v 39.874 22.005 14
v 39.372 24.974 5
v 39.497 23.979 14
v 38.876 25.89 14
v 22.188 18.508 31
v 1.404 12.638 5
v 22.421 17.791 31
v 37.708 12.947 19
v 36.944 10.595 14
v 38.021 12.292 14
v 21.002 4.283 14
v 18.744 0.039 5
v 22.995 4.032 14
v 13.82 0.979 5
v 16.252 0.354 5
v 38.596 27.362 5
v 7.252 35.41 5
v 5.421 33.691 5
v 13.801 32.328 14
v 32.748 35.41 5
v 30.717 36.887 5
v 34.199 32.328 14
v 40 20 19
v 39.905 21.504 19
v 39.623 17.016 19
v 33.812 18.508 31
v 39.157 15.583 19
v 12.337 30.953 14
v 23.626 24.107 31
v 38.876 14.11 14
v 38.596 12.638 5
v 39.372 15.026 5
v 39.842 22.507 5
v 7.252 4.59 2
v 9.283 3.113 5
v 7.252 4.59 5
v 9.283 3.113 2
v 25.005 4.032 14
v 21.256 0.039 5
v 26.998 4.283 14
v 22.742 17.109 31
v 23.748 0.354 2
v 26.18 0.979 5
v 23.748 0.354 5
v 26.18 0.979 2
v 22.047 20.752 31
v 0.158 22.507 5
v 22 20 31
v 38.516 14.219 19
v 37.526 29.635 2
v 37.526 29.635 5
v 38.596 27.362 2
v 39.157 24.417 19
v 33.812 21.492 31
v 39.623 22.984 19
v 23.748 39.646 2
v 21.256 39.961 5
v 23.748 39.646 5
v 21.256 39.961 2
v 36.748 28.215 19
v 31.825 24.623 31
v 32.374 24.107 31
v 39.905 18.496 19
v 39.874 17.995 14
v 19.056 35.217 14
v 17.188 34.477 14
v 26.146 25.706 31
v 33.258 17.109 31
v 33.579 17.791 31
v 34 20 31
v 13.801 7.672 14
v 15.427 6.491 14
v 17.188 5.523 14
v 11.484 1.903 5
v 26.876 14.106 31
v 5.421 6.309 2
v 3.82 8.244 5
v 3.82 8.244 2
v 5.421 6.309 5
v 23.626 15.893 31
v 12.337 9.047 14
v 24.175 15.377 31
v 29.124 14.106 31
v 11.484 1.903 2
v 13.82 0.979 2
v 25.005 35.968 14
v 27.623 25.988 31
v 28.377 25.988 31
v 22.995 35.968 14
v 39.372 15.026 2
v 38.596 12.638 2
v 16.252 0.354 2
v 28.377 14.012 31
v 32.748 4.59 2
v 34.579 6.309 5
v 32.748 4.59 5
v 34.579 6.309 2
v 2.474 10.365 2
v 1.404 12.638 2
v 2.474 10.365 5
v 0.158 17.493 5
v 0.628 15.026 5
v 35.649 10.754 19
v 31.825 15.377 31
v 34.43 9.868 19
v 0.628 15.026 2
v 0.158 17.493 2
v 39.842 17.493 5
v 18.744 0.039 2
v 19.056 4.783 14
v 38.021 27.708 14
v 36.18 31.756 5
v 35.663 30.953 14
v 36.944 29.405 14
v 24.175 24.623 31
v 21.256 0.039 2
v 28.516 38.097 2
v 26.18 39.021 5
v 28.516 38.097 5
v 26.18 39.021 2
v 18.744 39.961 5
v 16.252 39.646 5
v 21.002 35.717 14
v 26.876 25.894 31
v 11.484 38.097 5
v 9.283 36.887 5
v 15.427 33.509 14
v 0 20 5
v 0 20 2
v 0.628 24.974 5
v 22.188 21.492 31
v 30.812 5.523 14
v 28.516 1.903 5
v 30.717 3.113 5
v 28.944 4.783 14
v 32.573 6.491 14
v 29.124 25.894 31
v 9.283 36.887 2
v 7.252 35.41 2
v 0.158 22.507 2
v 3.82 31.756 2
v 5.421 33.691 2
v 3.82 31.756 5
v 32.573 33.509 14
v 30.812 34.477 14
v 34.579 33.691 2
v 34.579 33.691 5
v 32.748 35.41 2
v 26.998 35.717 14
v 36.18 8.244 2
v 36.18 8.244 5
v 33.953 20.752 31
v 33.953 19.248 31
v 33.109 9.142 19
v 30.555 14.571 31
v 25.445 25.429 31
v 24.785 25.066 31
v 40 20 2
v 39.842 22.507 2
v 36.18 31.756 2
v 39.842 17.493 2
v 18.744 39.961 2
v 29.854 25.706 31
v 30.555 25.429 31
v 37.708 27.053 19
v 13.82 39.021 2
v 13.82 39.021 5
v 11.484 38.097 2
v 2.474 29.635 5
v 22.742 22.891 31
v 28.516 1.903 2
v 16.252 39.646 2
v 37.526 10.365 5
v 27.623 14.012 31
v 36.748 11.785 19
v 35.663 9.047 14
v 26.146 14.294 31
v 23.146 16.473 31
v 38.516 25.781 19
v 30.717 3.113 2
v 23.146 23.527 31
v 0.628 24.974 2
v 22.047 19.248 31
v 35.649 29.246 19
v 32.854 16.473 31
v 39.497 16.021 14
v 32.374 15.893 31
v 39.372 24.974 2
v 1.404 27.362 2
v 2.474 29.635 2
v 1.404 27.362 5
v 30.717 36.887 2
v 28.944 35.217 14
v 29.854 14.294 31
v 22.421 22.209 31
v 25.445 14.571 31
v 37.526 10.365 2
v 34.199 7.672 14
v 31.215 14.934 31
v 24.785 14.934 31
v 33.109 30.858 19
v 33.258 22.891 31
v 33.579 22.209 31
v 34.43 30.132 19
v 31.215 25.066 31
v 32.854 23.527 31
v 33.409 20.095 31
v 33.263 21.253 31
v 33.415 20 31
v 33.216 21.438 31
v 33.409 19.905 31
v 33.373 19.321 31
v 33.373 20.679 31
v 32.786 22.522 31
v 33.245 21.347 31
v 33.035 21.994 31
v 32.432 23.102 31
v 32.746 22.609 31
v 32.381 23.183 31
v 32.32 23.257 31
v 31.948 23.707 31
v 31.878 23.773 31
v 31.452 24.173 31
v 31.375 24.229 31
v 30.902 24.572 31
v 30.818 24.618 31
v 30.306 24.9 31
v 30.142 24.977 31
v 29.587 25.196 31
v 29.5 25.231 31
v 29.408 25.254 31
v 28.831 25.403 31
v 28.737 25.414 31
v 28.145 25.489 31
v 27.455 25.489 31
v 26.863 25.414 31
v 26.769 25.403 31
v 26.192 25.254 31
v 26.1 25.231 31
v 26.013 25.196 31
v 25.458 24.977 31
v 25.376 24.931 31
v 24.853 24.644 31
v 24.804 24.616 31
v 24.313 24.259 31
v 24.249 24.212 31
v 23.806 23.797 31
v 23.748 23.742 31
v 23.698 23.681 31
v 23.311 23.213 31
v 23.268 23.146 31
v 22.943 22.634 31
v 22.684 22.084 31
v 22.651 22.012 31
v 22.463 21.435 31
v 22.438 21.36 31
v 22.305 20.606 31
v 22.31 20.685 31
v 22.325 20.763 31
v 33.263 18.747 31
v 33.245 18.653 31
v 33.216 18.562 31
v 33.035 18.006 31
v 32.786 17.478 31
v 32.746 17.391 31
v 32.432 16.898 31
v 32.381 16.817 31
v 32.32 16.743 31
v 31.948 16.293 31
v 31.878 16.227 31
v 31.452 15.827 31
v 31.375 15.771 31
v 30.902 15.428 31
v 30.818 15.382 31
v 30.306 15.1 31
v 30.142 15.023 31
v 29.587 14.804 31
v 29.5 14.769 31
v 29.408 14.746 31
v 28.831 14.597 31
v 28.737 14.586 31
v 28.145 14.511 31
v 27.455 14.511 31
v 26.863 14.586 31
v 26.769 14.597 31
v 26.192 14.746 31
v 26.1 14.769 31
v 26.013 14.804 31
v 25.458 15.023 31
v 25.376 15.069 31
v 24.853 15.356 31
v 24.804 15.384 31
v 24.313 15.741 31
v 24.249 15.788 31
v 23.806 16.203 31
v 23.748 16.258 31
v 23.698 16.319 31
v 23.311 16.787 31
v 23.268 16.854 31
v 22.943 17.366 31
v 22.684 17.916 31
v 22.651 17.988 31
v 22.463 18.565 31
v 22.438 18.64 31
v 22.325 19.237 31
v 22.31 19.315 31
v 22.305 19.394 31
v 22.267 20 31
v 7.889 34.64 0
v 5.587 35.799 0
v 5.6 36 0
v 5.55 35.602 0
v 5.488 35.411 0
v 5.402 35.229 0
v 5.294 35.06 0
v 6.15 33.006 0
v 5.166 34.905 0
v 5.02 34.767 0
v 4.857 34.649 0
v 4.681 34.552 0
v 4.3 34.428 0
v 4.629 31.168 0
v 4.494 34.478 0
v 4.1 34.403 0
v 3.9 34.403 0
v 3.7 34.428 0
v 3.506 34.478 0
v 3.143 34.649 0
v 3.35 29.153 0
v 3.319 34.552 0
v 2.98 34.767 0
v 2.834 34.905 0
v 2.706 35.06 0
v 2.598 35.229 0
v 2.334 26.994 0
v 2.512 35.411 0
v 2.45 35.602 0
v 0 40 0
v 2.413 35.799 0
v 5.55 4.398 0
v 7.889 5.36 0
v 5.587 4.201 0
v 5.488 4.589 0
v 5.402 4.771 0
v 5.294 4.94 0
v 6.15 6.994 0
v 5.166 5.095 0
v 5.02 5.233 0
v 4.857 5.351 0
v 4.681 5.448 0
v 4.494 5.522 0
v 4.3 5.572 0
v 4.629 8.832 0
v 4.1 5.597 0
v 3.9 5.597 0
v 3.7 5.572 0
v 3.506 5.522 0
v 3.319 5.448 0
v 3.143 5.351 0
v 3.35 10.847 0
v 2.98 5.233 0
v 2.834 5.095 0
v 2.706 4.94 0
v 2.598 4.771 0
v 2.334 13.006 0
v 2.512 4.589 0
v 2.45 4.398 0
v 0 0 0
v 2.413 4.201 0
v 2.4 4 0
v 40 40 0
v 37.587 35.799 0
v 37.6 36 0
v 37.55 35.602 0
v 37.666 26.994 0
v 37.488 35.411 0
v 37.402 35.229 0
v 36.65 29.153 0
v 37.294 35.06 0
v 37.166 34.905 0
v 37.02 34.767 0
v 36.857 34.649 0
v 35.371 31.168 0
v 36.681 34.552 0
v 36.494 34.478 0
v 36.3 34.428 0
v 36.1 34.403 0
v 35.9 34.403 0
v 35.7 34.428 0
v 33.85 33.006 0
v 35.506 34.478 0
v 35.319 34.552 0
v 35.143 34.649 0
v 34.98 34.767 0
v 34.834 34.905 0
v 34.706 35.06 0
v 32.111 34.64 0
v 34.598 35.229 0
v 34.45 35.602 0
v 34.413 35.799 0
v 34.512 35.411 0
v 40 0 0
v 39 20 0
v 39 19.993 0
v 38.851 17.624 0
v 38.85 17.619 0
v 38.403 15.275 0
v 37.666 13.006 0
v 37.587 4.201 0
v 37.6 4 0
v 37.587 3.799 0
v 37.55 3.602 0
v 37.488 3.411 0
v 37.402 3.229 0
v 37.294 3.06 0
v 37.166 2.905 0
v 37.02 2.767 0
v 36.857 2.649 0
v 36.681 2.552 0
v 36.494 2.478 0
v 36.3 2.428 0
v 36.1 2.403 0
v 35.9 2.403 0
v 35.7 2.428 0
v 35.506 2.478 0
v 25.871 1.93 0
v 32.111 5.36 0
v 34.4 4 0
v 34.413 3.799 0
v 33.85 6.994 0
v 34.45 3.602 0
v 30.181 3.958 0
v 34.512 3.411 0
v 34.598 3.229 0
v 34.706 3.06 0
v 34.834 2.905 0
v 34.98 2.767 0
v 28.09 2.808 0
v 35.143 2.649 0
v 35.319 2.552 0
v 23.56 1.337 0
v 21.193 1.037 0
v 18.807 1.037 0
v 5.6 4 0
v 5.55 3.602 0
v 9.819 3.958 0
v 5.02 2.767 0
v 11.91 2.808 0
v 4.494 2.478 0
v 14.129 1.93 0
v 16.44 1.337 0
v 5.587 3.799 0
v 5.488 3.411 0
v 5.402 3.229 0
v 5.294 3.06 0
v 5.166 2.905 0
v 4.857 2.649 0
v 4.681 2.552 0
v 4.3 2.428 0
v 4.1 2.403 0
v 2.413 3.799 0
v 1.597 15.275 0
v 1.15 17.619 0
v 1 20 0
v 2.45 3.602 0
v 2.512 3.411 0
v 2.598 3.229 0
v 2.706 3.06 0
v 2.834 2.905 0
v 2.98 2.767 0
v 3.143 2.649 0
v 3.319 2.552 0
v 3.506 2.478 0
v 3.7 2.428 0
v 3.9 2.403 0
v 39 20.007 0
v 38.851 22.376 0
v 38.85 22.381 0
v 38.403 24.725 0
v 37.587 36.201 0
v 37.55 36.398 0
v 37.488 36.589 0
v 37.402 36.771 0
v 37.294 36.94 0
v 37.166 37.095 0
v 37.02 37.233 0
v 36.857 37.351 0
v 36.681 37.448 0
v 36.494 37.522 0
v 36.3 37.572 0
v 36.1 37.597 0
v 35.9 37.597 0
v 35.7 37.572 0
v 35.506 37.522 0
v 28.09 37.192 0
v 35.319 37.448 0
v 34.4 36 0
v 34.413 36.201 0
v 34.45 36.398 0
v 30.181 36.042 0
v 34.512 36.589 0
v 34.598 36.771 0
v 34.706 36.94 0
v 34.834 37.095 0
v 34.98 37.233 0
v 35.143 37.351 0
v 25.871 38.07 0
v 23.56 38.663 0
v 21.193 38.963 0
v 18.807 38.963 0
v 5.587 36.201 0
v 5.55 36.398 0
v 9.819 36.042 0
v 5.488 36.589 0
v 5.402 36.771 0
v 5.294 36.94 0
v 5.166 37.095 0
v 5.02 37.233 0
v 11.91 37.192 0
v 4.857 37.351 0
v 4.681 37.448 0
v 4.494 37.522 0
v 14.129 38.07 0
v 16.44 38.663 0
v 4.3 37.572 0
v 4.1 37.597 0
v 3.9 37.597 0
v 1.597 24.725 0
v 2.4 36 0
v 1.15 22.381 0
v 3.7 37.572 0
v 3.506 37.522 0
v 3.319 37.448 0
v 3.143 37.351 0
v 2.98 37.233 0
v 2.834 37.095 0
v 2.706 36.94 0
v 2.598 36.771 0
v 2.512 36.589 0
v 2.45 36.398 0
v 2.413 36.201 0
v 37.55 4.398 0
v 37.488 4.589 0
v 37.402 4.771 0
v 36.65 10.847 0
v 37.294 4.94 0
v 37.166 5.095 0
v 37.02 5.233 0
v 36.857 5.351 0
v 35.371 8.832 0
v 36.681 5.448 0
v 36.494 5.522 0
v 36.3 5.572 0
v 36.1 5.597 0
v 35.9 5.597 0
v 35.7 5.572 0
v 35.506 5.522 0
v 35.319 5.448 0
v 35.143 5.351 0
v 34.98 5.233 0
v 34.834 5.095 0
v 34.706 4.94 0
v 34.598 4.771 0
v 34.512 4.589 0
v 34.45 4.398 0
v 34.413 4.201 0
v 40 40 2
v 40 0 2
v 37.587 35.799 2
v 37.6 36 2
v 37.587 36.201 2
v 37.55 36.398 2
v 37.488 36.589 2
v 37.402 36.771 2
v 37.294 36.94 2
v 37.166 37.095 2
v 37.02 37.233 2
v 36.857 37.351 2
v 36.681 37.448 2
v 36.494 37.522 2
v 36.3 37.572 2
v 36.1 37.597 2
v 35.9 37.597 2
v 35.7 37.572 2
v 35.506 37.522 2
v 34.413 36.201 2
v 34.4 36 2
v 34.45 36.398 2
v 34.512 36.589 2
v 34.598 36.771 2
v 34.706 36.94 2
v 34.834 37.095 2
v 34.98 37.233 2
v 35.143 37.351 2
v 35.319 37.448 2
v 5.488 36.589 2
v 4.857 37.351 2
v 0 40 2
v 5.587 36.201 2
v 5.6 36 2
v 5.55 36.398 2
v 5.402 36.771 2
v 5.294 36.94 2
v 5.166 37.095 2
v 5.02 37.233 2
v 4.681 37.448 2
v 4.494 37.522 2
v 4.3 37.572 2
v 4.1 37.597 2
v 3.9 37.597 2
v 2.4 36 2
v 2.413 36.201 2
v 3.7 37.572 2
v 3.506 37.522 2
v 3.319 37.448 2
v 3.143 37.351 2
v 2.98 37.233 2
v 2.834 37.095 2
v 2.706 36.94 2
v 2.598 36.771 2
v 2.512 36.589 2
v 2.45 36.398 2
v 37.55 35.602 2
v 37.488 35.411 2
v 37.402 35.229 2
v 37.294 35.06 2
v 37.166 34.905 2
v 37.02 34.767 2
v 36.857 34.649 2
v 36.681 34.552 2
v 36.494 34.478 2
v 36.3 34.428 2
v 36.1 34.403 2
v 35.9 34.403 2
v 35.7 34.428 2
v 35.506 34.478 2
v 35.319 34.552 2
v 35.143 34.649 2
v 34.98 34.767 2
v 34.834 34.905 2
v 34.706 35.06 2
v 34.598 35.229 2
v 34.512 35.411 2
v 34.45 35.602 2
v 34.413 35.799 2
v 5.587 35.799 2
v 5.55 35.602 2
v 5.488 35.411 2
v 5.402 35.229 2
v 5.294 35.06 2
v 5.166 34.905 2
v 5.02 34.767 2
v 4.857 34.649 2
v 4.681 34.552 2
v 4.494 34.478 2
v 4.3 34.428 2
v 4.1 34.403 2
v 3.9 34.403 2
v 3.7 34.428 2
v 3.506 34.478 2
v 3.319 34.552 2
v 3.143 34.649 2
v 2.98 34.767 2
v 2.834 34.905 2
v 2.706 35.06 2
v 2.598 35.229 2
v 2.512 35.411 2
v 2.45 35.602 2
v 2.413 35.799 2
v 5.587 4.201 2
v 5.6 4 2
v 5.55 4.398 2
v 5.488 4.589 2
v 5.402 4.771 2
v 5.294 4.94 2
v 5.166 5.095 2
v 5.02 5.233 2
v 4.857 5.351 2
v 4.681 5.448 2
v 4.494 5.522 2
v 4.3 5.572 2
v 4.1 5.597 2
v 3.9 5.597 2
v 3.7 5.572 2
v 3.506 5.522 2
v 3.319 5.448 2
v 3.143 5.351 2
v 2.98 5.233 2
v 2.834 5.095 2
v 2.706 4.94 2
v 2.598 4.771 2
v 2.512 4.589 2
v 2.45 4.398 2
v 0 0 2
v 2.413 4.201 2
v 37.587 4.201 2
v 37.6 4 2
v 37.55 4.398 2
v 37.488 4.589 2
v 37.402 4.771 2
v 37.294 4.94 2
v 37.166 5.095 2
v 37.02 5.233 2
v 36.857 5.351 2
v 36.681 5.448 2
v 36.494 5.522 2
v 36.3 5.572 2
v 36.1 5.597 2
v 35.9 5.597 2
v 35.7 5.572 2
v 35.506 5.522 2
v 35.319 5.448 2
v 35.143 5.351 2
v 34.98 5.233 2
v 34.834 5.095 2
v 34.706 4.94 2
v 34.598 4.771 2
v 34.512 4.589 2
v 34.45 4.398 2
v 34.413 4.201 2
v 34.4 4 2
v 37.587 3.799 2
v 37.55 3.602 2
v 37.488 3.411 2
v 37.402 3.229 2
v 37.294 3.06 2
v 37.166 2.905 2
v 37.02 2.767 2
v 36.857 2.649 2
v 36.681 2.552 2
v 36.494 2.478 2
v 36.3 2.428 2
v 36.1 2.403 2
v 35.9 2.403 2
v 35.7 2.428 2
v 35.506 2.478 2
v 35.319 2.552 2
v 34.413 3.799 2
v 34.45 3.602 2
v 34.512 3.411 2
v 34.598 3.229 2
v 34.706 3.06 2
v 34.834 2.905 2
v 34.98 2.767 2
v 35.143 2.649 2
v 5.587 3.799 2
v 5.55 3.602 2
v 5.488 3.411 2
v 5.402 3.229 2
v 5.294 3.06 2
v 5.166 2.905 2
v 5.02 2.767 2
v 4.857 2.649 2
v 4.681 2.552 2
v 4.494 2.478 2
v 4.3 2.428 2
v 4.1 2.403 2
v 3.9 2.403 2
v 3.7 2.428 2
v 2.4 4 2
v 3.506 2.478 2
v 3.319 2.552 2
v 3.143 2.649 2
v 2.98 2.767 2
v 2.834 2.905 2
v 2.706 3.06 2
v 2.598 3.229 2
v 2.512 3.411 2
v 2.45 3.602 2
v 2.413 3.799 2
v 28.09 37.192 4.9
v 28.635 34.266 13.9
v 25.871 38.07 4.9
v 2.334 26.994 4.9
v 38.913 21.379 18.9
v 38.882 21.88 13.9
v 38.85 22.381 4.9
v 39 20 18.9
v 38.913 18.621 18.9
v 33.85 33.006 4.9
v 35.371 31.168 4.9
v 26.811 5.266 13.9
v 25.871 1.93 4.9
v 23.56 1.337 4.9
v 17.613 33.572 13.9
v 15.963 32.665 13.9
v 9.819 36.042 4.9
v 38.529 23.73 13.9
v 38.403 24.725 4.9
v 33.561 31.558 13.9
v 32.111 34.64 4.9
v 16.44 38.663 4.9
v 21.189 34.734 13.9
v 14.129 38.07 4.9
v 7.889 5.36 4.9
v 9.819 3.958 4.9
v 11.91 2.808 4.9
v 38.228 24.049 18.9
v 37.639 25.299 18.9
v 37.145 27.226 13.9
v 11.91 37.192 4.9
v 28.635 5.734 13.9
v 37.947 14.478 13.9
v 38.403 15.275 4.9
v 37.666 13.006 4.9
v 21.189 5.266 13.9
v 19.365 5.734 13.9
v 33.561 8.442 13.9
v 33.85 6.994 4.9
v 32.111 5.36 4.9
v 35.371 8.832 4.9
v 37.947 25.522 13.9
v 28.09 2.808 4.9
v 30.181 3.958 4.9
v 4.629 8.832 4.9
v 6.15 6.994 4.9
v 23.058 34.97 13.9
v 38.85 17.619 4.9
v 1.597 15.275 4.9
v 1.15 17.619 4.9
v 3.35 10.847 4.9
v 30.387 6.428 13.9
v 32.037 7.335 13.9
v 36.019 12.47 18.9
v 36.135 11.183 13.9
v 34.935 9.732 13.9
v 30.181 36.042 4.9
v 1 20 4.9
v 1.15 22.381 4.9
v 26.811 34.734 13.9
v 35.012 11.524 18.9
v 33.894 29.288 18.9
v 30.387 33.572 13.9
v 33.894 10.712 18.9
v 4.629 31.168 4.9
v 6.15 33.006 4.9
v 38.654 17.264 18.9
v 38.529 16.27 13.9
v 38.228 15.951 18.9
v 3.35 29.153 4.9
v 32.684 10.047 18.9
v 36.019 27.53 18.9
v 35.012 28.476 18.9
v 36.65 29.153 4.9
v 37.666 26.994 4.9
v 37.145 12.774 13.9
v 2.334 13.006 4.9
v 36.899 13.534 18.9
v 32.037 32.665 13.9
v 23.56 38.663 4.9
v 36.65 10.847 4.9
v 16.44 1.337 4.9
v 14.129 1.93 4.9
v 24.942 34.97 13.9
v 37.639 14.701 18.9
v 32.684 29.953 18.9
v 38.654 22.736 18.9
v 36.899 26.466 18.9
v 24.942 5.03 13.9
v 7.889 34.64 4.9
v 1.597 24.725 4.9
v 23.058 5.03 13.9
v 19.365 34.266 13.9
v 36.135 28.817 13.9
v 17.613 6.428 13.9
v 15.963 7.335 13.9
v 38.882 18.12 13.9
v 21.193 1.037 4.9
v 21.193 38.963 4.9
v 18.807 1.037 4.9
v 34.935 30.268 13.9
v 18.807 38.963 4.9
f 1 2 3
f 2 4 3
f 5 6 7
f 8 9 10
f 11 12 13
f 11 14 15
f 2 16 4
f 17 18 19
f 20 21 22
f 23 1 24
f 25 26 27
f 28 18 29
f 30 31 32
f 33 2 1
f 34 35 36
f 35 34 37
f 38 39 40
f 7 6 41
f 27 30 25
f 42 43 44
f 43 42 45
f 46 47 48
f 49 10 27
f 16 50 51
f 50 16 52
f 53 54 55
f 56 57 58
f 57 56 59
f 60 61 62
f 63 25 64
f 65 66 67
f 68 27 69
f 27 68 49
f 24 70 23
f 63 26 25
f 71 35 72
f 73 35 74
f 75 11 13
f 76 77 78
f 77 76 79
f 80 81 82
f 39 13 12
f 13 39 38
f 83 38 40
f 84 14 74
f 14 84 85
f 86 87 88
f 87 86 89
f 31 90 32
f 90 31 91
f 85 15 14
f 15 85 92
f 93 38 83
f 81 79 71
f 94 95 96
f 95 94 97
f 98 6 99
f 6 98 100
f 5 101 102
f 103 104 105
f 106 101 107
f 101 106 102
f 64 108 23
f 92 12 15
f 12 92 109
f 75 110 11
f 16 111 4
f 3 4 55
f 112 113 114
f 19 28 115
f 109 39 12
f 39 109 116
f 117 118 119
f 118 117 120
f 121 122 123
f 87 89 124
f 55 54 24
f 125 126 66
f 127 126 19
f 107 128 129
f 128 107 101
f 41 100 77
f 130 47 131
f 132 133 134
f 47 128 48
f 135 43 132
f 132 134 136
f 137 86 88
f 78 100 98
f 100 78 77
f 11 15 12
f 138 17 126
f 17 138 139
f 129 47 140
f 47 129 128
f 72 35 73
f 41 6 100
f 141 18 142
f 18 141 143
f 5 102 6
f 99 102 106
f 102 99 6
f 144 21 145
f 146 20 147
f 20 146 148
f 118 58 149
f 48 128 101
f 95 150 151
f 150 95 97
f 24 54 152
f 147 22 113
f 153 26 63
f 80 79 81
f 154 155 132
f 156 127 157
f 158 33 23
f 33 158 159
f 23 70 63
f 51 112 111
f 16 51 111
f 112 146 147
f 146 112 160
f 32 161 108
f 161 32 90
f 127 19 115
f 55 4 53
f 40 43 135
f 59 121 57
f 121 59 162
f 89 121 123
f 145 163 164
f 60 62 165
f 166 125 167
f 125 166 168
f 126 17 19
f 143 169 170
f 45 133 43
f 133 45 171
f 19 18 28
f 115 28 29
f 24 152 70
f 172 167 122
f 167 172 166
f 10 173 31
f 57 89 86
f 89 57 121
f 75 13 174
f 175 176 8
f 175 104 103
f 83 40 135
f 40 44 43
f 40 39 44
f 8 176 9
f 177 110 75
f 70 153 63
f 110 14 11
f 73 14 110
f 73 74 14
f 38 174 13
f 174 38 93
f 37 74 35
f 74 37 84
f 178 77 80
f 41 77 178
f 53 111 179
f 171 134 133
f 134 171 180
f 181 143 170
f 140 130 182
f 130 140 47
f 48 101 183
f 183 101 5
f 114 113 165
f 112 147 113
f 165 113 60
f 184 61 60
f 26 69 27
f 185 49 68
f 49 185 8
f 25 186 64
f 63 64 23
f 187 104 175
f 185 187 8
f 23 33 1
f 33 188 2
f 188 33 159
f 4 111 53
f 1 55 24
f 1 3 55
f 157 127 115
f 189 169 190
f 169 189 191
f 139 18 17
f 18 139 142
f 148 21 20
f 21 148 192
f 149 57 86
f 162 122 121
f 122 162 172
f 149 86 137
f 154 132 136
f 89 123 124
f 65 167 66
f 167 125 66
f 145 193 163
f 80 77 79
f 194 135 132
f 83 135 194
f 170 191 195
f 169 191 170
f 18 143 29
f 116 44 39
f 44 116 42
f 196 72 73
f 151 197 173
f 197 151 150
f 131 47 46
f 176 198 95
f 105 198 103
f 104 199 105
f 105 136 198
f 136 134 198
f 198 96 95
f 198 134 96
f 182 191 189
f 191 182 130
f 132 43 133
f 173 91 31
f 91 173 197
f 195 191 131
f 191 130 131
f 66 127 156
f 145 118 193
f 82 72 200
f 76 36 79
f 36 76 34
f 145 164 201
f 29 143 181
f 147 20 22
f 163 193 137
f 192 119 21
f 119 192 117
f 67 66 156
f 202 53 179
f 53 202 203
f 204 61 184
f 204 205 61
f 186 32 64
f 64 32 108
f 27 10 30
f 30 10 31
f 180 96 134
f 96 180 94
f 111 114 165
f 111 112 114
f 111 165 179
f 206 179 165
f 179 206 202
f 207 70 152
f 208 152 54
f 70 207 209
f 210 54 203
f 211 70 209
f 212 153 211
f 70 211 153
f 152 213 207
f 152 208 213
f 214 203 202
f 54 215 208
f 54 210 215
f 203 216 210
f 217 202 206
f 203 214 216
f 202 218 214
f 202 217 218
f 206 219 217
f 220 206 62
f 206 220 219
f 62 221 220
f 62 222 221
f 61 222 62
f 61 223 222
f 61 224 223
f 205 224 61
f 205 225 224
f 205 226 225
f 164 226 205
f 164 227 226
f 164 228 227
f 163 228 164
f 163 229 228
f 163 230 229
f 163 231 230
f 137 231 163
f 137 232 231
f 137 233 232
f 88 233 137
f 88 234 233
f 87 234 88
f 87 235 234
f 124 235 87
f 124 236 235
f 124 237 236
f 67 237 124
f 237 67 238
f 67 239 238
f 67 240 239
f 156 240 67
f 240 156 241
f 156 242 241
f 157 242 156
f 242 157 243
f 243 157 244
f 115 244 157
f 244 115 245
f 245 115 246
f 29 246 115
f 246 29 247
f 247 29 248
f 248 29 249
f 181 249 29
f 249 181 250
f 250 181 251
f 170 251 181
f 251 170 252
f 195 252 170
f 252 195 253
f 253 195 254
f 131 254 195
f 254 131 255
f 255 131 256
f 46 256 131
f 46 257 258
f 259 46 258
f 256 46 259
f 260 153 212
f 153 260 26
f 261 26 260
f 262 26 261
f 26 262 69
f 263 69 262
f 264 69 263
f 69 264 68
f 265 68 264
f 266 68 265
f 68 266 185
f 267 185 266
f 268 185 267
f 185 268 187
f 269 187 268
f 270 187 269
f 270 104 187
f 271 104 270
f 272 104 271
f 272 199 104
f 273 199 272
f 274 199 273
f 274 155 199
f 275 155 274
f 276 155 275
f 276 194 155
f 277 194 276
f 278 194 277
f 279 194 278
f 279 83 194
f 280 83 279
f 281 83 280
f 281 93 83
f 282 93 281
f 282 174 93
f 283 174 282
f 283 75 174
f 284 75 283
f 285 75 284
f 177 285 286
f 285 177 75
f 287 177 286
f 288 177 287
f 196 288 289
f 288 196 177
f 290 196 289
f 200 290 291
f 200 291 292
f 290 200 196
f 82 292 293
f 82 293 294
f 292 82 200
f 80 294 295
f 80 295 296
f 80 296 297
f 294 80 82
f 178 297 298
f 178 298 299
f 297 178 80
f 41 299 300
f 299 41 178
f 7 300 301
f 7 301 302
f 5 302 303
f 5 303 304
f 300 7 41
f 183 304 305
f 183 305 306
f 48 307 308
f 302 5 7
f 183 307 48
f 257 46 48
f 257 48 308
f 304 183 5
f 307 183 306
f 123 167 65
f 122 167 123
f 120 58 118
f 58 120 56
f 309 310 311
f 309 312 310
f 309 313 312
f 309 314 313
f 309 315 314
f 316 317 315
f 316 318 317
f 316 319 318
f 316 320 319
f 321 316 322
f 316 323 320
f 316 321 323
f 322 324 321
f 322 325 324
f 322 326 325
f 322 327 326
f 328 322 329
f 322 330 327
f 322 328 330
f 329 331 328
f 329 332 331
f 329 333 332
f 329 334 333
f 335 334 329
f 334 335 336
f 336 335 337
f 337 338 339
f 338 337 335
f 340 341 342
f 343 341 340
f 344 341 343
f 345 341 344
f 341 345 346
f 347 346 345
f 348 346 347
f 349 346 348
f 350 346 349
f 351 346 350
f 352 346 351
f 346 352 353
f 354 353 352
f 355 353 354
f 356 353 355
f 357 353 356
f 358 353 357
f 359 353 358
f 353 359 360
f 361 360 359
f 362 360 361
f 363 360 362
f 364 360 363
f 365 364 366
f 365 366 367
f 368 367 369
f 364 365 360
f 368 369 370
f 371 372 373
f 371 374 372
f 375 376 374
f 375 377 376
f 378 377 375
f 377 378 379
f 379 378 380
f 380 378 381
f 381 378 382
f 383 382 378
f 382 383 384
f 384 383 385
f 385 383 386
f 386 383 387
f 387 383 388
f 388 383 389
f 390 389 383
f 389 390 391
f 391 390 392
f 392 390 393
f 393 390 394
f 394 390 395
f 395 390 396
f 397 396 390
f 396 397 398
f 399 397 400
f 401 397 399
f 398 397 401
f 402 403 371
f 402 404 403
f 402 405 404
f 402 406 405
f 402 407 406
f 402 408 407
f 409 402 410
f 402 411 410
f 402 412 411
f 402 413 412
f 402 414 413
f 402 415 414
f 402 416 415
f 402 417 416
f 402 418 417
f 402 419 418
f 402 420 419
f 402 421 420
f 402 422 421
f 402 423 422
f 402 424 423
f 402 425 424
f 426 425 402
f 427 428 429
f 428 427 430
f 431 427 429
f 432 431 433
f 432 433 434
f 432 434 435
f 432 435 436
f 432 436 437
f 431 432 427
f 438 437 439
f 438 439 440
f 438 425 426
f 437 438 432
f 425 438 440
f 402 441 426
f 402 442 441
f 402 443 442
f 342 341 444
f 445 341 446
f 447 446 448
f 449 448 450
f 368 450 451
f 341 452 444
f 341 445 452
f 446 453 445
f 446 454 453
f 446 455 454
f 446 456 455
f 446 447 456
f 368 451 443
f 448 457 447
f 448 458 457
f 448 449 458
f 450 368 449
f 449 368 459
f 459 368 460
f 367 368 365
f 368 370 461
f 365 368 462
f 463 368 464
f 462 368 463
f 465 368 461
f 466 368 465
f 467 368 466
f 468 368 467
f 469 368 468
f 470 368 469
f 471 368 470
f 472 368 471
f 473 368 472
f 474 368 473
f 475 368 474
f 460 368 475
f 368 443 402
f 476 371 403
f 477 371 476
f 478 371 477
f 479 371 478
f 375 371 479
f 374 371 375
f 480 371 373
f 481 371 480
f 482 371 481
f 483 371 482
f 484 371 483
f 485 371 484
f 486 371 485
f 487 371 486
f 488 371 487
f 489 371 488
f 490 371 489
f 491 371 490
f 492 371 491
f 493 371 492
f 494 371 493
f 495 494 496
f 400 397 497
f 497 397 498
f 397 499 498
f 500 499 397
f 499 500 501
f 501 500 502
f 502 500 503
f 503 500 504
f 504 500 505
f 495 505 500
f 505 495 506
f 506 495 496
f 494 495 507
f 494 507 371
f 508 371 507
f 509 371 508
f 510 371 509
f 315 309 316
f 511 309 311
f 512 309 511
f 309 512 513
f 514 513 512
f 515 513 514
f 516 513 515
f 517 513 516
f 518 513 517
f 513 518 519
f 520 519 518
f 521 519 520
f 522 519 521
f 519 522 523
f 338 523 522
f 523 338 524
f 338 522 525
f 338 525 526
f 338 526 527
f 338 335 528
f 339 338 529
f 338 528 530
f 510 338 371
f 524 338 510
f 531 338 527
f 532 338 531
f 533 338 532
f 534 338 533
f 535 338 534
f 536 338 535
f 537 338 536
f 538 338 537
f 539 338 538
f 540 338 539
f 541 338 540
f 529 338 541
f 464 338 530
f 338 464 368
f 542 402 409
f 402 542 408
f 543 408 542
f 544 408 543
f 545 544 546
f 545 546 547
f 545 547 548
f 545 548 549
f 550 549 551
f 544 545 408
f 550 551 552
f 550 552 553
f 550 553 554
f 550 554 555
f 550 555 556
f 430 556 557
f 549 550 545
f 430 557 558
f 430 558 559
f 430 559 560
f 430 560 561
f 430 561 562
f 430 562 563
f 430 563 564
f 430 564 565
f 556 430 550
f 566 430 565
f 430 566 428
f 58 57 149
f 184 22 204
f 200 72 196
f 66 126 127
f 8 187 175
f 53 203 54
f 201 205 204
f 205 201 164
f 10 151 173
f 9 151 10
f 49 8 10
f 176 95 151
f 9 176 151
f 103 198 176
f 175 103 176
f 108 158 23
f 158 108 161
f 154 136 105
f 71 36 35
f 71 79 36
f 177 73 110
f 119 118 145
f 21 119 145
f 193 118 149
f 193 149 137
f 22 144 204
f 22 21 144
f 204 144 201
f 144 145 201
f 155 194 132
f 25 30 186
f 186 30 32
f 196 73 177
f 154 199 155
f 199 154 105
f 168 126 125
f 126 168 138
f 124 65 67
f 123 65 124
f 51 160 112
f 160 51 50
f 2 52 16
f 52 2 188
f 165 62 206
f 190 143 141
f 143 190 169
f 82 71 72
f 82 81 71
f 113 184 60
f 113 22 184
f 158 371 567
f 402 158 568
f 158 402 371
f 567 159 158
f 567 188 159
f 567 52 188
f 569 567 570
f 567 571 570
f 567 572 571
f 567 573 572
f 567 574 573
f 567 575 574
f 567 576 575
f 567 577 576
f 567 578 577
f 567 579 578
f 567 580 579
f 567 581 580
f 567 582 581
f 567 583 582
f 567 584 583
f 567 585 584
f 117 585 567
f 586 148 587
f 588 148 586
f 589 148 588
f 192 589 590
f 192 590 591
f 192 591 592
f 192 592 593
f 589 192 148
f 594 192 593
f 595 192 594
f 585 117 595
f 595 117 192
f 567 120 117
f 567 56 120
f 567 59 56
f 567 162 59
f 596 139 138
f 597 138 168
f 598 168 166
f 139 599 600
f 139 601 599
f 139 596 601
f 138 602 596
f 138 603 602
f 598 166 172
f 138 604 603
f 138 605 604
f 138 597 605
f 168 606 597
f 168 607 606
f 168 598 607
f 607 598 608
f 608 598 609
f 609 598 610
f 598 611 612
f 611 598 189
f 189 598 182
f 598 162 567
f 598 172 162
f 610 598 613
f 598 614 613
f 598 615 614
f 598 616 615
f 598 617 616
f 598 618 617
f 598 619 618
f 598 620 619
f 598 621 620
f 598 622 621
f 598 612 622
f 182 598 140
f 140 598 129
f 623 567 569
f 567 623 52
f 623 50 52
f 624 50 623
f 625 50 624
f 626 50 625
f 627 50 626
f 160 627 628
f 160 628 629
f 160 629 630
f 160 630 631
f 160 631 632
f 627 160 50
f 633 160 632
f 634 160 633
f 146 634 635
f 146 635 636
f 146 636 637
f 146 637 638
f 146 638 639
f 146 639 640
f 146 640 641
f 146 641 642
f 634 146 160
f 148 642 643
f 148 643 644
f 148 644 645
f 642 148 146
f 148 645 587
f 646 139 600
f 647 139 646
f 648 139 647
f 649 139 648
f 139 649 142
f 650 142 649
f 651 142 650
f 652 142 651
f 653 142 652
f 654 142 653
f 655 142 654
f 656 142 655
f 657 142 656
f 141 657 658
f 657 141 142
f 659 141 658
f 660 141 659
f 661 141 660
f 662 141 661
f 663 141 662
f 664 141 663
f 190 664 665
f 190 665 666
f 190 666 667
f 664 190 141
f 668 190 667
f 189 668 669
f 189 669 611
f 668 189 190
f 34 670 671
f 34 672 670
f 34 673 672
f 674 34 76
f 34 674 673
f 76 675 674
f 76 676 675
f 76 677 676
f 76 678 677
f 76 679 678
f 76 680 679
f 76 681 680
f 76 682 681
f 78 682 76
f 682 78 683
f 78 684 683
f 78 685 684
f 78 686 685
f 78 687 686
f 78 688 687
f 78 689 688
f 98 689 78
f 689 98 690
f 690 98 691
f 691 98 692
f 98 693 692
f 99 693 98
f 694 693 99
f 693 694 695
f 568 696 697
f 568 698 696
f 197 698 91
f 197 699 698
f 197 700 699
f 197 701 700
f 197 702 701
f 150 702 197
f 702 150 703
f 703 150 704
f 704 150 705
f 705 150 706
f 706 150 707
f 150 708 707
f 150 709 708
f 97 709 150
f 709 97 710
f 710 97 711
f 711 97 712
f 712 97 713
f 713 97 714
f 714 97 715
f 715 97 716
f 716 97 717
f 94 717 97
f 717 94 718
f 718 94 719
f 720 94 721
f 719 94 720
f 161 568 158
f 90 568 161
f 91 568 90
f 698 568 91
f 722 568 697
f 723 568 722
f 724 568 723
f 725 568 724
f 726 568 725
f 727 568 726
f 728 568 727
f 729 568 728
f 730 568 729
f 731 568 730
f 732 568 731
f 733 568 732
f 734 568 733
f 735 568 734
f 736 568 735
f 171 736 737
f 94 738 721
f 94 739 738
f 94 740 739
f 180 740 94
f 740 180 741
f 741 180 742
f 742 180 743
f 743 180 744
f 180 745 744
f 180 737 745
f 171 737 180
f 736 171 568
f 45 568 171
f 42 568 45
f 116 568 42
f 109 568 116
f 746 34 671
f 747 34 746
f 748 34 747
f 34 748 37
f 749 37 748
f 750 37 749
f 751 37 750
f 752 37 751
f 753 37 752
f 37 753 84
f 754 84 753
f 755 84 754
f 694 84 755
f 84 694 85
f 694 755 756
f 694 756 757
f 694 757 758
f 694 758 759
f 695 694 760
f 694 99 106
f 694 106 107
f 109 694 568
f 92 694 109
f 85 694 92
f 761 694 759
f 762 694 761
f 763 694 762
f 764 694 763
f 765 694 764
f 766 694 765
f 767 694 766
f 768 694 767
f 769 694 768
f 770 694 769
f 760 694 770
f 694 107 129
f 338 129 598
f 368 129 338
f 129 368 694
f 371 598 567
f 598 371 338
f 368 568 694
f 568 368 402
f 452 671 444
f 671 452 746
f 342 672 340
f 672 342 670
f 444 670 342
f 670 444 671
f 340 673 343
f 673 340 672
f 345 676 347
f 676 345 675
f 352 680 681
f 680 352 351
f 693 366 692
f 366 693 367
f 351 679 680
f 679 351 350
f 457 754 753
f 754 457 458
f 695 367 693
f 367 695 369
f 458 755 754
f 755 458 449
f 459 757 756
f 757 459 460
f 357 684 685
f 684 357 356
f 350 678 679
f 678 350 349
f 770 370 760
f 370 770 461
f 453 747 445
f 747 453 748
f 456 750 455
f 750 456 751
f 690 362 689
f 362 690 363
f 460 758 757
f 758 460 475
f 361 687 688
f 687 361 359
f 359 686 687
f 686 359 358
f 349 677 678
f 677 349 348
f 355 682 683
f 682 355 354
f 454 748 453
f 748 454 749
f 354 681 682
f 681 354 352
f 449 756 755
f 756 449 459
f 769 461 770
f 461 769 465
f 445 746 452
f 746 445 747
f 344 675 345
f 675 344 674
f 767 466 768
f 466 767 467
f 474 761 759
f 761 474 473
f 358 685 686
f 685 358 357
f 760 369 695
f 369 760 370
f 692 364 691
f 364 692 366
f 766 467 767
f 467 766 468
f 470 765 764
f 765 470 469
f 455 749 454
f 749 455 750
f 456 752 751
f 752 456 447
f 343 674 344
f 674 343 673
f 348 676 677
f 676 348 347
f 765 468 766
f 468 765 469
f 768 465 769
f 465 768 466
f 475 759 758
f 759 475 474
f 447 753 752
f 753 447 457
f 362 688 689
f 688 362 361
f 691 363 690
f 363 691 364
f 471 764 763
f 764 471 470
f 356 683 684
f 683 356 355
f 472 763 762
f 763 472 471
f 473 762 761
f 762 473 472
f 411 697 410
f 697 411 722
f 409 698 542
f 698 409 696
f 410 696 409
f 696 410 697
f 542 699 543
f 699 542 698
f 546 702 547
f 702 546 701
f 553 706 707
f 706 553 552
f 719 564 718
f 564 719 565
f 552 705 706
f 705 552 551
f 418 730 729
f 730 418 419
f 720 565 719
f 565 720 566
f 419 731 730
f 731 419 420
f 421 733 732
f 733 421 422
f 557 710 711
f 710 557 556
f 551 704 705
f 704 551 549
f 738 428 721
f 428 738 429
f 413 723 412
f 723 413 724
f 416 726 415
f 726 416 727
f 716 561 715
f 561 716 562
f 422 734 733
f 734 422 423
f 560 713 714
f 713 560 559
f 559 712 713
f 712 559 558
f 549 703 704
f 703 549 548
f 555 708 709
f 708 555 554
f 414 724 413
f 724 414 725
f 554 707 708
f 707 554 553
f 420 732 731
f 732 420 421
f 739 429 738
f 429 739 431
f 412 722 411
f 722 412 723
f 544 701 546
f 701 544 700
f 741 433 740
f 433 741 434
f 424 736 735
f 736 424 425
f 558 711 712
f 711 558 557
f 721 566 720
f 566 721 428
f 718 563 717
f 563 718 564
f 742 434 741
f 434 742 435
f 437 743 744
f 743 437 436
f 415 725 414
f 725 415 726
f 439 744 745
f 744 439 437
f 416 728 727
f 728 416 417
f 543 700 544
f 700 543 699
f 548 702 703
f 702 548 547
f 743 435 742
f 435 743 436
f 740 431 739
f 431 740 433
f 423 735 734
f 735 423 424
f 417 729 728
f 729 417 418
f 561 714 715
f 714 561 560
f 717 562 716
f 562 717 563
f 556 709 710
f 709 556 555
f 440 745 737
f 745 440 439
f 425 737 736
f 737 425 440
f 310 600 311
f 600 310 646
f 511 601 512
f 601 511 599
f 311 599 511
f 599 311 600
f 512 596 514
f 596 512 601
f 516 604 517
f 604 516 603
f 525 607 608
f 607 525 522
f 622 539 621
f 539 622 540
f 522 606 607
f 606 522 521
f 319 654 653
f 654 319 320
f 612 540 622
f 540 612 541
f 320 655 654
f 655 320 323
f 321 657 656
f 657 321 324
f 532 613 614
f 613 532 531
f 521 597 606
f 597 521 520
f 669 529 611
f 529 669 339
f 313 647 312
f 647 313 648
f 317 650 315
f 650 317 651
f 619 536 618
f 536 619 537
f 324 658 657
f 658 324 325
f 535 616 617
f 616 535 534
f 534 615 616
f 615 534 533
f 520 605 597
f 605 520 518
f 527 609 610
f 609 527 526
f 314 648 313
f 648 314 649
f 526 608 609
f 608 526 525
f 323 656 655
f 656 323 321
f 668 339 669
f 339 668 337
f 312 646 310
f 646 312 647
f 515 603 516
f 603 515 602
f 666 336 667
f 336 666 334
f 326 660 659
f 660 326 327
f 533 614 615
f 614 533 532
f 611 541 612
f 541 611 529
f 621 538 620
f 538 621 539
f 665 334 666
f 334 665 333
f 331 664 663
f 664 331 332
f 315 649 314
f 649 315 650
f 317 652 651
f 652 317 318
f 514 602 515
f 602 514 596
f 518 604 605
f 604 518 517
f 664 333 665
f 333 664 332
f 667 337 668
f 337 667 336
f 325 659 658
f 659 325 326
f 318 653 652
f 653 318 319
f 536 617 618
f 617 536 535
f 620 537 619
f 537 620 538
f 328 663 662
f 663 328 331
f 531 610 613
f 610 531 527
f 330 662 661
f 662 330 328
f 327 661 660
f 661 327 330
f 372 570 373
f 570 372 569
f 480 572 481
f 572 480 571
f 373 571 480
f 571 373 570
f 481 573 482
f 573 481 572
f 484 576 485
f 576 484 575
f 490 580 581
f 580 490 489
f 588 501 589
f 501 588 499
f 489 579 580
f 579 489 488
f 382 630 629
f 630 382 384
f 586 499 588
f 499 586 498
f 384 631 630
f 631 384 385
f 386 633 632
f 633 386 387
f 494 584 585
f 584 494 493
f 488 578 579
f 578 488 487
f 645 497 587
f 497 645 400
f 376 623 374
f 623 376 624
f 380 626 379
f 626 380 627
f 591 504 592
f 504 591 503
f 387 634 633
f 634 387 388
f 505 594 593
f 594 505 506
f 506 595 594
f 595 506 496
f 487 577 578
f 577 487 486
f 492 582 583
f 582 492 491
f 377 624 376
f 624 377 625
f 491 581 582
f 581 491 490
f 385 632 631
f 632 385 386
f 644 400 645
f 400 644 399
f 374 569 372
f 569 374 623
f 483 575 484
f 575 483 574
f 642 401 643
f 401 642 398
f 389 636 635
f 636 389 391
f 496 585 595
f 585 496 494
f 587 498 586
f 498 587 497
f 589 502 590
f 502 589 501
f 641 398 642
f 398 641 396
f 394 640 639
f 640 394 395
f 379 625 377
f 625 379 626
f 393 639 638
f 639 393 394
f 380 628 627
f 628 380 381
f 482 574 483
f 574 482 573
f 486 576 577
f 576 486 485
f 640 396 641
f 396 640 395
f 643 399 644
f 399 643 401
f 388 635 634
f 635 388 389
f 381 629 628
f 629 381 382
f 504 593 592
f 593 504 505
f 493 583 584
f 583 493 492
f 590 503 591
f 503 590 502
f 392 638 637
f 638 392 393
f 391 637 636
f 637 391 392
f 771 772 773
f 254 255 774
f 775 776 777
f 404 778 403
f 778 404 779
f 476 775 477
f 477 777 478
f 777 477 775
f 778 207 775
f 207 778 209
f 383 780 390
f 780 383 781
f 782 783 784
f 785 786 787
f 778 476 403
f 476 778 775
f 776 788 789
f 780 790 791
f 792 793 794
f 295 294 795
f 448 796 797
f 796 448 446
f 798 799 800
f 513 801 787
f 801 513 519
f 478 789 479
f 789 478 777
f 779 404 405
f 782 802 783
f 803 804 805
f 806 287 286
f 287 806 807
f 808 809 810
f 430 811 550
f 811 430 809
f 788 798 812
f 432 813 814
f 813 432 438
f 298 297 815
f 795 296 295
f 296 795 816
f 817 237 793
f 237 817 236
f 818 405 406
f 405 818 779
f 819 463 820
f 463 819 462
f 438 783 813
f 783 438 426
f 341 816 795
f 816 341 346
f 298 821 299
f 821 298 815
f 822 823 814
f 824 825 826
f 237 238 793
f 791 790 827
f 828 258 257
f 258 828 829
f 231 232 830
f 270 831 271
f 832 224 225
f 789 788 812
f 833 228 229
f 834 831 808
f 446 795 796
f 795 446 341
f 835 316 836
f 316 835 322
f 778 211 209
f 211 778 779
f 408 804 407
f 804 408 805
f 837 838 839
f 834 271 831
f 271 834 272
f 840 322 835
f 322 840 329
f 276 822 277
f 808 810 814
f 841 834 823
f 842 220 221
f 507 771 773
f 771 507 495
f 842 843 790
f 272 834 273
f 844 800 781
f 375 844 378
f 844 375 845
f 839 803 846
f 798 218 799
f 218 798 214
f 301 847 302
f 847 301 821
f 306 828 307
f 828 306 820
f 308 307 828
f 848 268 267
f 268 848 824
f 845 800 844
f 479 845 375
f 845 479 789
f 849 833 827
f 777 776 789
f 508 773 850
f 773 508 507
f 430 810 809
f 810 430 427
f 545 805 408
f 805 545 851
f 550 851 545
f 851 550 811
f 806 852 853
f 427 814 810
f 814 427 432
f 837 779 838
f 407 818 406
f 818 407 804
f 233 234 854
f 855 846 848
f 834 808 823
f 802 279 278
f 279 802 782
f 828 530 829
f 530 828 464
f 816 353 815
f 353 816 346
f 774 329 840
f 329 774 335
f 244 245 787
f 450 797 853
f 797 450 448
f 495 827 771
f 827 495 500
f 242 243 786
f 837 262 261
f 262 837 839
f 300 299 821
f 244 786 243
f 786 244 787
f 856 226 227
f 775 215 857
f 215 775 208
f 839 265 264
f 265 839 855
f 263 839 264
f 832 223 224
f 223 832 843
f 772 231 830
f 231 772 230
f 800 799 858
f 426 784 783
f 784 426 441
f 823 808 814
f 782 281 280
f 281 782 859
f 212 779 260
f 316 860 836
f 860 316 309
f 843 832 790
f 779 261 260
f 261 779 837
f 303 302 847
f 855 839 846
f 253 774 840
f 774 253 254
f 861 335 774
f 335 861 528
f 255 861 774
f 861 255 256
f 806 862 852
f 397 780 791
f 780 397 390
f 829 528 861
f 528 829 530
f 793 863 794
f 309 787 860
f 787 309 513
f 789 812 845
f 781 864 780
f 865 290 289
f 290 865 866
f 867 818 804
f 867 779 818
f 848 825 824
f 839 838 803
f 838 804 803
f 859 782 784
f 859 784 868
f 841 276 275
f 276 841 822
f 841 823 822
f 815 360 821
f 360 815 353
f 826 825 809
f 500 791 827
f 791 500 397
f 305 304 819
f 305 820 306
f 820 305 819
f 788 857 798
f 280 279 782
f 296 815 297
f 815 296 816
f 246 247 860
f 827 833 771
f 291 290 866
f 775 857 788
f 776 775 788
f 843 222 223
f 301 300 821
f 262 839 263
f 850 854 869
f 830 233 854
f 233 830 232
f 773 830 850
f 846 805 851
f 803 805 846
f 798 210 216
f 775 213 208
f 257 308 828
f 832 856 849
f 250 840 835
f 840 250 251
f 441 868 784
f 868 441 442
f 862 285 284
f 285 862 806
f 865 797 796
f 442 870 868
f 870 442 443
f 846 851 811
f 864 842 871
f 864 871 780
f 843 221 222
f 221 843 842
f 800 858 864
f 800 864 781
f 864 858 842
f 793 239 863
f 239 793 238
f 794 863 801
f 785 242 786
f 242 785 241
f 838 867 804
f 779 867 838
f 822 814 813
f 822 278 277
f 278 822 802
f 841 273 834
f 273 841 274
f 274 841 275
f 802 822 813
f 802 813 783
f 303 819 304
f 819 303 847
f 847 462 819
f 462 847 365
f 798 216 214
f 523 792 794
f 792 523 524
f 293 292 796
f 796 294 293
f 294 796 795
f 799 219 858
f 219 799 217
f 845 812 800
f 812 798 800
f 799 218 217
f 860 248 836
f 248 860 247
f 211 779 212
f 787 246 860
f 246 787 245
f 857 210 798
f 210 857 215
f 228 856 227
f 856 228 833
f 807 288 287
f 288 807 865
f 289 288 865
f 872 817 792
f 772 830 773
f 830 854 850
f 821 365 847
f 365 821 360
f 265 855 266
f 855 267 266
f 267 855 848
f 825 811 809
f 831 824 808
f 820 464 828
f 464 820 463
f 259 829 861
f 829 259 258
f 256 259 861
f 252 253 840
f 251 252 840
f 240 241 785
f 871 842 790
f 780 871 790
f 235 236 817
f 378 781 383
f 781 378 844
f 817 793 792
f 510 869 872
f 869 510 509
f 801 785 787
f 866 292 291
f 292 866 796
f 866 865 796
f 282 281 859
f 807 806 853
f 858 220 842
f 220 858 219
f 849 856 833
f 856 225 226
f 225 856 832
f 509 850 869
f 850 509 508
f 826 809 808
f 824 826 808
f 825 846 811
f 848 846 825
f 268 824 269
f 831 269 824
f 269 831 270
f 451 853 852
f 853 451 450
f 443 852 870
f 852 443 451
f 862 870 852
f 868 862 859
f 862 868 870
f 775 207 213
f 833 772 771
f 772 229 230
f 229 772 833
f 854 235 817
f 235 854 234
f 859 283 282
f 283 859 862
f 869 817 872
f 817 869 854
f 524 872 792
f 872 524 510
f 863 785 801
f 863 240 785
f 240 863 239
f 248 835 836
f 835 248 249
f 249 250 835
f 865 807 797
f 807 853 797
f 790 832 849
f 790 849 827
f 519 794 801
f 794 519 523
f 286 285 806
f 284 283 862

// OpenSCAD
$fn=50;

enlong = 20;

rad = 1.6;
//cylinder(r=2,h=32);



sak();

module enlongate()
{
  cube([40,enlong,3]);
}

//enlongate();

//translate([0,enlong,0])
//sak();
/*
difference()
{

union()
{
translate([0,-2.1,0])
cube([40,3,3]);


translate([0,0,2.1])
rotate([45+90,0,0])

cube([40,8,3]);
//sak();
}

translate([0,0,2.1])
rotate([45+90,0,0])

union()
{
translate([5,4,-1])
cylinder(r=1.8, h=10);

translate([31+5,4,-1])
cylinder(r=1.8, h=10);

translate([5,4,-1])
cylinder(r=3, h=3);

translate([31+5,4,-1])
cylinder(r=3, h=3);


}
}

*/
/*
hull()
{
translate([5,5,0])
cylinder(r=5,h=3);
translate([31+5,5,0])
cylinder(r=5,h=3);
}
*/


//translate([0,0,0])
//rotate([90,0,0])

module sak()
{
union()
{
difference()
{
  union()
  {
    translate([20,20,0])
    hull()
{
cylinder(r=20,h=5);
translate([4,0,13])
cylinder(r=16,h=1);
translate([8,0,18])
cylinder(r=12,h=1);

translate([8,0,25])
cylinder(r=8,h=1);

translate([8,0,30])
cylinder(r=6,h=1);
}


    cube([40,40,2]);
    translate([20,20,0])
    cylinder(r=20,h=3);
  }

  union()
  {
    translate([4,4,-.1])
    cylinder(r=rad,h=5);

    translate([32+4,4,-.1])
    cylinder(r=rad,h=5);

    translate([4,32+4,-.1])
    cylinder(r=rad,h=5);

    translate([32+4,32+4,-.1])
    cylinder(r=rad,h=5);

translate([20,20,-.1])
hull()
{
cylinder(r=19,h=5);
translate([4,0,13])
cylinder(r=15,h=1);
translate([8,0,18])
cylinder(r=11,h=1);

translate([8,0,25])
cylinder(r=7,h=1);

translate([8,0,30])
cylinder(r=5,h=2);
}
    
  }
}
}
}
